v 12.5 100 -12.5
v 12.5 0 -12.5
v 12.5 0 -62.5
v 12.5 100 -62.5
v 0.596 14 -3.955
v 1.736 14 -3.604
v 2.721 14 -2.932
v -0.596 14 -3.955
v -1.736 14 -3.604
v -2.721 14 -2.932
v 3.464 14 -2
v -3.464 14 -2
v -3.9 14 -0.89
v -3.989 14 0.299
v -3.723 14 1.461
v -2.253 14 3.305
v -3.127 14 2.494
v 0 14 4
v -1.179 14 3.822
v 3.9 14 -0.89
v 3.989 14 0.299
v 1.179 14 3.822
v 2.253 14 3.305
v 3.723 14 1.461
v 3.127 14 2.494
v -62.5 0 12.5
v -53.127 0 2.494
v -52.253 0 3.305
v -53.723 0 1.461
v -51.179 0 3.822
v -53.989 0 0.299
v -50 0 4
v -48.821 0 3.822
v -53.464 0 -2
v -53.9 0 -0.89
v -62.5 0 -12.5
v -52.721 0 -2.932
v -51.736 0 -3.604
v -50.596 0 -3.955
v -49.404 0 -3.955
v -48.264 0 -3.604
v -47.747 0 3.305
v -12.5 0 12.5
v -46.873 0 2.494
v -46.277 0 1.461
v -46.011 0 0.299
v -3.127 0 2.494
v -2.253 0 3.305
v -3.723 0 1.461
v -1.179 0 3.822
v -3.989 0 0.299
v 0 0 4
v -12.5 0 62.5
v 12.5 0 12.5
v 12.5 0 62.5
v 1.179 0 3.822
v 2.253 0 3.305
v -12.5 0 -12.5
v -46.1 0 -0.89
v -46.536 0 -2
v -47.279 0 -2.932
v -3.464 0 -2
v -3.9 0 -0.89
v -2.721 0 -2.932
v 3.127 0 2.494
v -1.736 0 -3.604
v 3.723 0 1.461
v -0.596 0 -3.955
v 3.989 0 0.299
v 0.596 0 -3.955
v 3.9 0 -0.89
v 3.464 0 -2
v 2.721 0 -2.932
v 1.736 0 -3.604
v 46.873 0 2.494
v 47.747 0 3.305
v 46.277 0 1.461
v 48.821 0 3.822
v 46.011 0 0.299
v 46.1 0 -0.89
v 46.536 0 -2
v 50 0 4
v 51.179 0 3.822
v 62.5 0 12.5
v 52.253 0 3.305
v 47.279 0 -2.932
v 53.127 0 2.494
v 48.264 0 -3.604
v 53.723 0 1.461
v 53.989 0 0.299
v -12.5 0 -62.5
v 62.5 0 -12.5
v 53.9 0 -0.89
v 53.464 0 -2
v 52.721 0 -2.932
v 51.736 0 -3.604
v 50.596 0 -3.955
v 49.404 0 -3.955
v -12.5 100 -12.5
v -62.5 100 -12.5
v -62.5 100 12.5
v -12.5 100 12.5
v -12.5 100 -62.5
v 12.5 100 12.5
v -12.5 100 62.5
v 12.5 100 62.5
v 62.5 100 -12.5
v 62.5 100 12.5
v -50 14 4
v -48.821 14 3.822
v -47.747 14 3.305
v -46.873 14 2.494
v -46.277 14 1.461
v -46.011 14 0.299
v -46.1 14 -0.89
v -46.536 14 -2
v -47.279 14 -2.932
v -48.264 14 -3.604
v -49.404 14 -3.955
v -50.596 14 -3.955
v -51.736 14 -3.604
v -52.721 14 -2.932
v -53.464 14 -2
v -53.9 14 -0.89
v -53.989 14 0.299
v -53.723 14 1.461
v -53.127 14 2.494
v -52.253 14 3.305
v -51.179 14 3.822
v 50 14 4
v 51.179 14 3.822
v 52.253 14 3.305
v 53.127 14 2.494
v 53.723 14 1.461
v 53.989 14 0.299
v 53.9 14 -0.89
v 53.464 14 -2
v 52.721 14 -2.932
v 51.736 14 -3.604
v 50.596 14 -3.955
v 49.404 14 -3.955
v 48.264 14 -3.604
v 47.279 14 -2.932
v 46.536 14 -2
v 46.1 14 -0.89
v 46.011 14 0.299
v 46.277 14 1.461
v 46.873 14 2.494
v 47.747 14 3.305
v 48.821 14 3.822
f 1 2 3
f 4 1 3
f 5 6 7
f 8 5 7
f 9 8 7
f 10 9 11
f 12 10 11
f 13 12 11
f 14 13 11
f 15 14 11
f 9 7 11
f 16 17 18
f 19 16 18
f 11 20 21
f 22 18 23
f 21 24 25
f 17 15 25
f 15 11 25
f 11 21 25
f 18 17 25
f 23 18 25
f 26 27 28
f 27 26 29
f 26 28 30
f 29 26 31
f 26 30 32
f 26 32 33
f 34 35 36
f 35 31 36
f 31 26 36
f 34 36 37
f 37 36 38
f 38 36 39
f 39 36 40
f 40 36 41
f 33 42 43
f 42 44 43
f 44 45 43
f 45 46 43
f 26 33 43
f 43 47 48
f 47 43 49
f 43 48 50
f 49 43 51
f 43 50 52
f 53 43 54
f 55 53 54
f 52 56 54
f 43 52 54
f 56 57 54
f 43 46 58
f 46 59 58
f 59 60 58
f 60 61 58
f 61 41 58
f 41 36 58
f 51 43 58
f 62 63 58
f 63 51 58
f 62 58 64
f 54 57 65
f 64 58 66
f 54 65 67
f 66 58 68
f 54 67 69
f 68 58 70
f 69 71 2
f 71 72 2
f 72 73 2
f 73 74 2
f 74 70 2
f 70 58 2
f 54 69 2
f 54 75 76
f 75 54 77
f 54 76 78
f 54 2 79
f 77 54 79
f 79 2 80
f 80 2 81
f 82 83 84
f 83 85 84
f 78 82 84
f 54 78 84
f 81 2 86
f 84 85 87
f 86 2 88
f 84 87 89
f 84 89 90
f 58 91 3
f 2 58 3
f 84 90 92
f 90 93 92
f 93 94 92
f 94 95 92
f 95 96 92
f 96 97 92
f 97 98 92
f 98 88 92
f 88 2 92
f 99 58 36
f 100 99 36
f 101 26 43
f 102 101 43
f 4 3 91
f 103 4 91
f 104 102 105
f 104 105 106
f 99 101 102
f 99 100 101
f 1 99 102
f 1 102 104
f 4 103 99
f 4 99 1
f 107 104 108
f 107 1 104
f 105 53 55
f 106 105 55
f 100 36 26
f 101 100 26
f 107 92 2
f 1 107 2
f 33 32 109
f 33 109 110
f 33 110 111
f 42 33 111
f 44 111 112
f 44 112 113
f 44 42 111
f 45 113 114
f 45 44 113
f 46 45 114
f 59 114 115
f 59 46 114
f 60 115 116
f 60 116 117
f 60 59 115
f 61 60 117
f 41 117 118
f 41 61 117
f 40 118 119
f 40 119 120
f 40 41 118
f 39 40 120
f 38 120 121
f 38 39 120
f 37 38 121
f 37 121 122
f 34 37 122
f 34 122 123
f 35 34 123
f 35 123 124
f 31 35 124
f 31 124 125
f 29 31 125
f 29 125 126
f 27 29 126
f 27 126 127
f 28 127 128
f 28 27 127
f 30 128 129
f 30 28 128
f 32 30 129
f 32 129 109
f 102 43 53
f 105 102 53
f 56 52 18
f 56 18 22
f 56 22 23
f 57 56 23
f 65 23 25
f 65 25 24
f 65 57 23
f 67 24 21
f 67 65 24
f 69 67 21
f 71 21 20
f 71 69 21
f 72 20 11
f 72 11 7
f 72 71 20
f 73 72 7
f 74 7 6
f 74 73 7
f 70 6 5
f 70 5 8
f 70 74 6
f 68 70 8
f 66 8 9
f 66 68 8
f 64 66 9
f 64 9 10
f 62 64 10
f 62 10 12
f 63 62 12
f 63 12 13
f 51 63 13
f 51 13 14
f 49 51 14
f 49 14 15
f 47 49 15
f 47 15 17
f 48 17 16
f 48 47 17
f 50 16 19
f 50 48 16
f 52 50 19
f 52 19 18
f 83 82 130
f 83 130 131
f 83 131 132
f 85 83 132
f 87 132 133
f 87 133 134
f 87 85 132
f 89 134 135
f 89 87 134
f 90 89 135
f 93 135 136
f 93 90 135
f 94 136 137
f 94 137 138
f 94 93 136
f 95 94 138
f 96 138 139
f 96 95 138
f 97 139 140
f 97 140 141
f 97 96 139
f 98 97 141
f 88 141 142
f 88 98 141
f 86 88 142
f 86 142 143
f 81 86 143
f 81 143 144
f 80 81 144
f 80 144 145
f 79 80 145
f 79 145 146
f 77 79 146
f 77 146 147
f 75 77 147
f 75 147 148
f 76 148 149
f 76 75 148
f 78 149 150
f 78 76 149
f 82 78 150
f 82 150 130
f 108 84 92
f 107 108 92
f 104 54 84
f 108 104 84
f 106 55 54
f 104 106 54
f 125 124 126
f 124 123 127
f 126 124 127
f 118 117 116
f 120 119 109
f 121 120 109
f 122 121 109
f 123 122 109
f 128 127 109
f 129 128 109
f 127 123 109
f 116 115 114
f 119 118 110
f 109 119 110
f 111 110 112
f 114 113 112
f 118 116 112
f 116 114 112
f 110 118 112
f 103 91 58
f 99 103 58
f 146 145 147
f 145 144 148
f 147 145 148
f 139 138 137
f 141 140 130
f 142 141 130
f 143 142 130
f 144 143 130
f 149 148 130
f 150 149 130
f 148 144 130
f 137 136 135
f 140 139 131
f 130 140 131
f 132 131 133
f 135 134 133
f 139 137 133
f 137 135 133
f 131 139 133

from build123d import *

# Parameters (mm, degrees)
CRUZ_DEPTH                 = 100
CROQUIS_AGUJEROS_MONTAJE_R = 4
AGUJERO_INSERTO_M6_DEPTH   = 14


with BuildPart() as part:
    # Croquis_cruz → Cruz (new body)
    with BuildSketch(Plane(origin=(0, 0, 0), x_dir=(1, 0, 0), z_dir=(0, 1, 0))):
        Polygon((-62.5, -12.5), (-12.5, -12.5), (-12.5, -62.5), (12.5, -62.5), (12.5, -12.5), (62.5, -12.5), (62.5, 12.5), (12.5, 12.5), (12.5, 62.5), (-12.5, 62.5), (-12.5, 12.5), (-62.5, 12.5), align=None)
    extrude(amount=CRUZ_DEPTH)

    # Croquis_agujeros_montaje → Agujero_inserto_M6 (cut)
    with BuildSketch(Plane(origin=(0, 0, 0), x_dir=(1, 0, 0), z_dir=(0, 1, 0))):
        with Locations(Location((-50, 0, 0), (0, 0, 270))):
            Circle(CROQUIS_AGUJEROS_MONTAJE_R)
        with Locations(Location((0, 0, 0), (0, 0, 270))):
            Circle(CROQUIS_AGUJEROS_MONTAJE_R)
        with Locations(Location((50, 0, 0), (0, 0, 270))):
            Circle(CROQUIS_AGUJEROS_MONTAJE_R)
    extrude(amount=AGUJERO_INSERTO_M6_DEPTH, mode=Mode.SUBTRACT)


solid = part.part
